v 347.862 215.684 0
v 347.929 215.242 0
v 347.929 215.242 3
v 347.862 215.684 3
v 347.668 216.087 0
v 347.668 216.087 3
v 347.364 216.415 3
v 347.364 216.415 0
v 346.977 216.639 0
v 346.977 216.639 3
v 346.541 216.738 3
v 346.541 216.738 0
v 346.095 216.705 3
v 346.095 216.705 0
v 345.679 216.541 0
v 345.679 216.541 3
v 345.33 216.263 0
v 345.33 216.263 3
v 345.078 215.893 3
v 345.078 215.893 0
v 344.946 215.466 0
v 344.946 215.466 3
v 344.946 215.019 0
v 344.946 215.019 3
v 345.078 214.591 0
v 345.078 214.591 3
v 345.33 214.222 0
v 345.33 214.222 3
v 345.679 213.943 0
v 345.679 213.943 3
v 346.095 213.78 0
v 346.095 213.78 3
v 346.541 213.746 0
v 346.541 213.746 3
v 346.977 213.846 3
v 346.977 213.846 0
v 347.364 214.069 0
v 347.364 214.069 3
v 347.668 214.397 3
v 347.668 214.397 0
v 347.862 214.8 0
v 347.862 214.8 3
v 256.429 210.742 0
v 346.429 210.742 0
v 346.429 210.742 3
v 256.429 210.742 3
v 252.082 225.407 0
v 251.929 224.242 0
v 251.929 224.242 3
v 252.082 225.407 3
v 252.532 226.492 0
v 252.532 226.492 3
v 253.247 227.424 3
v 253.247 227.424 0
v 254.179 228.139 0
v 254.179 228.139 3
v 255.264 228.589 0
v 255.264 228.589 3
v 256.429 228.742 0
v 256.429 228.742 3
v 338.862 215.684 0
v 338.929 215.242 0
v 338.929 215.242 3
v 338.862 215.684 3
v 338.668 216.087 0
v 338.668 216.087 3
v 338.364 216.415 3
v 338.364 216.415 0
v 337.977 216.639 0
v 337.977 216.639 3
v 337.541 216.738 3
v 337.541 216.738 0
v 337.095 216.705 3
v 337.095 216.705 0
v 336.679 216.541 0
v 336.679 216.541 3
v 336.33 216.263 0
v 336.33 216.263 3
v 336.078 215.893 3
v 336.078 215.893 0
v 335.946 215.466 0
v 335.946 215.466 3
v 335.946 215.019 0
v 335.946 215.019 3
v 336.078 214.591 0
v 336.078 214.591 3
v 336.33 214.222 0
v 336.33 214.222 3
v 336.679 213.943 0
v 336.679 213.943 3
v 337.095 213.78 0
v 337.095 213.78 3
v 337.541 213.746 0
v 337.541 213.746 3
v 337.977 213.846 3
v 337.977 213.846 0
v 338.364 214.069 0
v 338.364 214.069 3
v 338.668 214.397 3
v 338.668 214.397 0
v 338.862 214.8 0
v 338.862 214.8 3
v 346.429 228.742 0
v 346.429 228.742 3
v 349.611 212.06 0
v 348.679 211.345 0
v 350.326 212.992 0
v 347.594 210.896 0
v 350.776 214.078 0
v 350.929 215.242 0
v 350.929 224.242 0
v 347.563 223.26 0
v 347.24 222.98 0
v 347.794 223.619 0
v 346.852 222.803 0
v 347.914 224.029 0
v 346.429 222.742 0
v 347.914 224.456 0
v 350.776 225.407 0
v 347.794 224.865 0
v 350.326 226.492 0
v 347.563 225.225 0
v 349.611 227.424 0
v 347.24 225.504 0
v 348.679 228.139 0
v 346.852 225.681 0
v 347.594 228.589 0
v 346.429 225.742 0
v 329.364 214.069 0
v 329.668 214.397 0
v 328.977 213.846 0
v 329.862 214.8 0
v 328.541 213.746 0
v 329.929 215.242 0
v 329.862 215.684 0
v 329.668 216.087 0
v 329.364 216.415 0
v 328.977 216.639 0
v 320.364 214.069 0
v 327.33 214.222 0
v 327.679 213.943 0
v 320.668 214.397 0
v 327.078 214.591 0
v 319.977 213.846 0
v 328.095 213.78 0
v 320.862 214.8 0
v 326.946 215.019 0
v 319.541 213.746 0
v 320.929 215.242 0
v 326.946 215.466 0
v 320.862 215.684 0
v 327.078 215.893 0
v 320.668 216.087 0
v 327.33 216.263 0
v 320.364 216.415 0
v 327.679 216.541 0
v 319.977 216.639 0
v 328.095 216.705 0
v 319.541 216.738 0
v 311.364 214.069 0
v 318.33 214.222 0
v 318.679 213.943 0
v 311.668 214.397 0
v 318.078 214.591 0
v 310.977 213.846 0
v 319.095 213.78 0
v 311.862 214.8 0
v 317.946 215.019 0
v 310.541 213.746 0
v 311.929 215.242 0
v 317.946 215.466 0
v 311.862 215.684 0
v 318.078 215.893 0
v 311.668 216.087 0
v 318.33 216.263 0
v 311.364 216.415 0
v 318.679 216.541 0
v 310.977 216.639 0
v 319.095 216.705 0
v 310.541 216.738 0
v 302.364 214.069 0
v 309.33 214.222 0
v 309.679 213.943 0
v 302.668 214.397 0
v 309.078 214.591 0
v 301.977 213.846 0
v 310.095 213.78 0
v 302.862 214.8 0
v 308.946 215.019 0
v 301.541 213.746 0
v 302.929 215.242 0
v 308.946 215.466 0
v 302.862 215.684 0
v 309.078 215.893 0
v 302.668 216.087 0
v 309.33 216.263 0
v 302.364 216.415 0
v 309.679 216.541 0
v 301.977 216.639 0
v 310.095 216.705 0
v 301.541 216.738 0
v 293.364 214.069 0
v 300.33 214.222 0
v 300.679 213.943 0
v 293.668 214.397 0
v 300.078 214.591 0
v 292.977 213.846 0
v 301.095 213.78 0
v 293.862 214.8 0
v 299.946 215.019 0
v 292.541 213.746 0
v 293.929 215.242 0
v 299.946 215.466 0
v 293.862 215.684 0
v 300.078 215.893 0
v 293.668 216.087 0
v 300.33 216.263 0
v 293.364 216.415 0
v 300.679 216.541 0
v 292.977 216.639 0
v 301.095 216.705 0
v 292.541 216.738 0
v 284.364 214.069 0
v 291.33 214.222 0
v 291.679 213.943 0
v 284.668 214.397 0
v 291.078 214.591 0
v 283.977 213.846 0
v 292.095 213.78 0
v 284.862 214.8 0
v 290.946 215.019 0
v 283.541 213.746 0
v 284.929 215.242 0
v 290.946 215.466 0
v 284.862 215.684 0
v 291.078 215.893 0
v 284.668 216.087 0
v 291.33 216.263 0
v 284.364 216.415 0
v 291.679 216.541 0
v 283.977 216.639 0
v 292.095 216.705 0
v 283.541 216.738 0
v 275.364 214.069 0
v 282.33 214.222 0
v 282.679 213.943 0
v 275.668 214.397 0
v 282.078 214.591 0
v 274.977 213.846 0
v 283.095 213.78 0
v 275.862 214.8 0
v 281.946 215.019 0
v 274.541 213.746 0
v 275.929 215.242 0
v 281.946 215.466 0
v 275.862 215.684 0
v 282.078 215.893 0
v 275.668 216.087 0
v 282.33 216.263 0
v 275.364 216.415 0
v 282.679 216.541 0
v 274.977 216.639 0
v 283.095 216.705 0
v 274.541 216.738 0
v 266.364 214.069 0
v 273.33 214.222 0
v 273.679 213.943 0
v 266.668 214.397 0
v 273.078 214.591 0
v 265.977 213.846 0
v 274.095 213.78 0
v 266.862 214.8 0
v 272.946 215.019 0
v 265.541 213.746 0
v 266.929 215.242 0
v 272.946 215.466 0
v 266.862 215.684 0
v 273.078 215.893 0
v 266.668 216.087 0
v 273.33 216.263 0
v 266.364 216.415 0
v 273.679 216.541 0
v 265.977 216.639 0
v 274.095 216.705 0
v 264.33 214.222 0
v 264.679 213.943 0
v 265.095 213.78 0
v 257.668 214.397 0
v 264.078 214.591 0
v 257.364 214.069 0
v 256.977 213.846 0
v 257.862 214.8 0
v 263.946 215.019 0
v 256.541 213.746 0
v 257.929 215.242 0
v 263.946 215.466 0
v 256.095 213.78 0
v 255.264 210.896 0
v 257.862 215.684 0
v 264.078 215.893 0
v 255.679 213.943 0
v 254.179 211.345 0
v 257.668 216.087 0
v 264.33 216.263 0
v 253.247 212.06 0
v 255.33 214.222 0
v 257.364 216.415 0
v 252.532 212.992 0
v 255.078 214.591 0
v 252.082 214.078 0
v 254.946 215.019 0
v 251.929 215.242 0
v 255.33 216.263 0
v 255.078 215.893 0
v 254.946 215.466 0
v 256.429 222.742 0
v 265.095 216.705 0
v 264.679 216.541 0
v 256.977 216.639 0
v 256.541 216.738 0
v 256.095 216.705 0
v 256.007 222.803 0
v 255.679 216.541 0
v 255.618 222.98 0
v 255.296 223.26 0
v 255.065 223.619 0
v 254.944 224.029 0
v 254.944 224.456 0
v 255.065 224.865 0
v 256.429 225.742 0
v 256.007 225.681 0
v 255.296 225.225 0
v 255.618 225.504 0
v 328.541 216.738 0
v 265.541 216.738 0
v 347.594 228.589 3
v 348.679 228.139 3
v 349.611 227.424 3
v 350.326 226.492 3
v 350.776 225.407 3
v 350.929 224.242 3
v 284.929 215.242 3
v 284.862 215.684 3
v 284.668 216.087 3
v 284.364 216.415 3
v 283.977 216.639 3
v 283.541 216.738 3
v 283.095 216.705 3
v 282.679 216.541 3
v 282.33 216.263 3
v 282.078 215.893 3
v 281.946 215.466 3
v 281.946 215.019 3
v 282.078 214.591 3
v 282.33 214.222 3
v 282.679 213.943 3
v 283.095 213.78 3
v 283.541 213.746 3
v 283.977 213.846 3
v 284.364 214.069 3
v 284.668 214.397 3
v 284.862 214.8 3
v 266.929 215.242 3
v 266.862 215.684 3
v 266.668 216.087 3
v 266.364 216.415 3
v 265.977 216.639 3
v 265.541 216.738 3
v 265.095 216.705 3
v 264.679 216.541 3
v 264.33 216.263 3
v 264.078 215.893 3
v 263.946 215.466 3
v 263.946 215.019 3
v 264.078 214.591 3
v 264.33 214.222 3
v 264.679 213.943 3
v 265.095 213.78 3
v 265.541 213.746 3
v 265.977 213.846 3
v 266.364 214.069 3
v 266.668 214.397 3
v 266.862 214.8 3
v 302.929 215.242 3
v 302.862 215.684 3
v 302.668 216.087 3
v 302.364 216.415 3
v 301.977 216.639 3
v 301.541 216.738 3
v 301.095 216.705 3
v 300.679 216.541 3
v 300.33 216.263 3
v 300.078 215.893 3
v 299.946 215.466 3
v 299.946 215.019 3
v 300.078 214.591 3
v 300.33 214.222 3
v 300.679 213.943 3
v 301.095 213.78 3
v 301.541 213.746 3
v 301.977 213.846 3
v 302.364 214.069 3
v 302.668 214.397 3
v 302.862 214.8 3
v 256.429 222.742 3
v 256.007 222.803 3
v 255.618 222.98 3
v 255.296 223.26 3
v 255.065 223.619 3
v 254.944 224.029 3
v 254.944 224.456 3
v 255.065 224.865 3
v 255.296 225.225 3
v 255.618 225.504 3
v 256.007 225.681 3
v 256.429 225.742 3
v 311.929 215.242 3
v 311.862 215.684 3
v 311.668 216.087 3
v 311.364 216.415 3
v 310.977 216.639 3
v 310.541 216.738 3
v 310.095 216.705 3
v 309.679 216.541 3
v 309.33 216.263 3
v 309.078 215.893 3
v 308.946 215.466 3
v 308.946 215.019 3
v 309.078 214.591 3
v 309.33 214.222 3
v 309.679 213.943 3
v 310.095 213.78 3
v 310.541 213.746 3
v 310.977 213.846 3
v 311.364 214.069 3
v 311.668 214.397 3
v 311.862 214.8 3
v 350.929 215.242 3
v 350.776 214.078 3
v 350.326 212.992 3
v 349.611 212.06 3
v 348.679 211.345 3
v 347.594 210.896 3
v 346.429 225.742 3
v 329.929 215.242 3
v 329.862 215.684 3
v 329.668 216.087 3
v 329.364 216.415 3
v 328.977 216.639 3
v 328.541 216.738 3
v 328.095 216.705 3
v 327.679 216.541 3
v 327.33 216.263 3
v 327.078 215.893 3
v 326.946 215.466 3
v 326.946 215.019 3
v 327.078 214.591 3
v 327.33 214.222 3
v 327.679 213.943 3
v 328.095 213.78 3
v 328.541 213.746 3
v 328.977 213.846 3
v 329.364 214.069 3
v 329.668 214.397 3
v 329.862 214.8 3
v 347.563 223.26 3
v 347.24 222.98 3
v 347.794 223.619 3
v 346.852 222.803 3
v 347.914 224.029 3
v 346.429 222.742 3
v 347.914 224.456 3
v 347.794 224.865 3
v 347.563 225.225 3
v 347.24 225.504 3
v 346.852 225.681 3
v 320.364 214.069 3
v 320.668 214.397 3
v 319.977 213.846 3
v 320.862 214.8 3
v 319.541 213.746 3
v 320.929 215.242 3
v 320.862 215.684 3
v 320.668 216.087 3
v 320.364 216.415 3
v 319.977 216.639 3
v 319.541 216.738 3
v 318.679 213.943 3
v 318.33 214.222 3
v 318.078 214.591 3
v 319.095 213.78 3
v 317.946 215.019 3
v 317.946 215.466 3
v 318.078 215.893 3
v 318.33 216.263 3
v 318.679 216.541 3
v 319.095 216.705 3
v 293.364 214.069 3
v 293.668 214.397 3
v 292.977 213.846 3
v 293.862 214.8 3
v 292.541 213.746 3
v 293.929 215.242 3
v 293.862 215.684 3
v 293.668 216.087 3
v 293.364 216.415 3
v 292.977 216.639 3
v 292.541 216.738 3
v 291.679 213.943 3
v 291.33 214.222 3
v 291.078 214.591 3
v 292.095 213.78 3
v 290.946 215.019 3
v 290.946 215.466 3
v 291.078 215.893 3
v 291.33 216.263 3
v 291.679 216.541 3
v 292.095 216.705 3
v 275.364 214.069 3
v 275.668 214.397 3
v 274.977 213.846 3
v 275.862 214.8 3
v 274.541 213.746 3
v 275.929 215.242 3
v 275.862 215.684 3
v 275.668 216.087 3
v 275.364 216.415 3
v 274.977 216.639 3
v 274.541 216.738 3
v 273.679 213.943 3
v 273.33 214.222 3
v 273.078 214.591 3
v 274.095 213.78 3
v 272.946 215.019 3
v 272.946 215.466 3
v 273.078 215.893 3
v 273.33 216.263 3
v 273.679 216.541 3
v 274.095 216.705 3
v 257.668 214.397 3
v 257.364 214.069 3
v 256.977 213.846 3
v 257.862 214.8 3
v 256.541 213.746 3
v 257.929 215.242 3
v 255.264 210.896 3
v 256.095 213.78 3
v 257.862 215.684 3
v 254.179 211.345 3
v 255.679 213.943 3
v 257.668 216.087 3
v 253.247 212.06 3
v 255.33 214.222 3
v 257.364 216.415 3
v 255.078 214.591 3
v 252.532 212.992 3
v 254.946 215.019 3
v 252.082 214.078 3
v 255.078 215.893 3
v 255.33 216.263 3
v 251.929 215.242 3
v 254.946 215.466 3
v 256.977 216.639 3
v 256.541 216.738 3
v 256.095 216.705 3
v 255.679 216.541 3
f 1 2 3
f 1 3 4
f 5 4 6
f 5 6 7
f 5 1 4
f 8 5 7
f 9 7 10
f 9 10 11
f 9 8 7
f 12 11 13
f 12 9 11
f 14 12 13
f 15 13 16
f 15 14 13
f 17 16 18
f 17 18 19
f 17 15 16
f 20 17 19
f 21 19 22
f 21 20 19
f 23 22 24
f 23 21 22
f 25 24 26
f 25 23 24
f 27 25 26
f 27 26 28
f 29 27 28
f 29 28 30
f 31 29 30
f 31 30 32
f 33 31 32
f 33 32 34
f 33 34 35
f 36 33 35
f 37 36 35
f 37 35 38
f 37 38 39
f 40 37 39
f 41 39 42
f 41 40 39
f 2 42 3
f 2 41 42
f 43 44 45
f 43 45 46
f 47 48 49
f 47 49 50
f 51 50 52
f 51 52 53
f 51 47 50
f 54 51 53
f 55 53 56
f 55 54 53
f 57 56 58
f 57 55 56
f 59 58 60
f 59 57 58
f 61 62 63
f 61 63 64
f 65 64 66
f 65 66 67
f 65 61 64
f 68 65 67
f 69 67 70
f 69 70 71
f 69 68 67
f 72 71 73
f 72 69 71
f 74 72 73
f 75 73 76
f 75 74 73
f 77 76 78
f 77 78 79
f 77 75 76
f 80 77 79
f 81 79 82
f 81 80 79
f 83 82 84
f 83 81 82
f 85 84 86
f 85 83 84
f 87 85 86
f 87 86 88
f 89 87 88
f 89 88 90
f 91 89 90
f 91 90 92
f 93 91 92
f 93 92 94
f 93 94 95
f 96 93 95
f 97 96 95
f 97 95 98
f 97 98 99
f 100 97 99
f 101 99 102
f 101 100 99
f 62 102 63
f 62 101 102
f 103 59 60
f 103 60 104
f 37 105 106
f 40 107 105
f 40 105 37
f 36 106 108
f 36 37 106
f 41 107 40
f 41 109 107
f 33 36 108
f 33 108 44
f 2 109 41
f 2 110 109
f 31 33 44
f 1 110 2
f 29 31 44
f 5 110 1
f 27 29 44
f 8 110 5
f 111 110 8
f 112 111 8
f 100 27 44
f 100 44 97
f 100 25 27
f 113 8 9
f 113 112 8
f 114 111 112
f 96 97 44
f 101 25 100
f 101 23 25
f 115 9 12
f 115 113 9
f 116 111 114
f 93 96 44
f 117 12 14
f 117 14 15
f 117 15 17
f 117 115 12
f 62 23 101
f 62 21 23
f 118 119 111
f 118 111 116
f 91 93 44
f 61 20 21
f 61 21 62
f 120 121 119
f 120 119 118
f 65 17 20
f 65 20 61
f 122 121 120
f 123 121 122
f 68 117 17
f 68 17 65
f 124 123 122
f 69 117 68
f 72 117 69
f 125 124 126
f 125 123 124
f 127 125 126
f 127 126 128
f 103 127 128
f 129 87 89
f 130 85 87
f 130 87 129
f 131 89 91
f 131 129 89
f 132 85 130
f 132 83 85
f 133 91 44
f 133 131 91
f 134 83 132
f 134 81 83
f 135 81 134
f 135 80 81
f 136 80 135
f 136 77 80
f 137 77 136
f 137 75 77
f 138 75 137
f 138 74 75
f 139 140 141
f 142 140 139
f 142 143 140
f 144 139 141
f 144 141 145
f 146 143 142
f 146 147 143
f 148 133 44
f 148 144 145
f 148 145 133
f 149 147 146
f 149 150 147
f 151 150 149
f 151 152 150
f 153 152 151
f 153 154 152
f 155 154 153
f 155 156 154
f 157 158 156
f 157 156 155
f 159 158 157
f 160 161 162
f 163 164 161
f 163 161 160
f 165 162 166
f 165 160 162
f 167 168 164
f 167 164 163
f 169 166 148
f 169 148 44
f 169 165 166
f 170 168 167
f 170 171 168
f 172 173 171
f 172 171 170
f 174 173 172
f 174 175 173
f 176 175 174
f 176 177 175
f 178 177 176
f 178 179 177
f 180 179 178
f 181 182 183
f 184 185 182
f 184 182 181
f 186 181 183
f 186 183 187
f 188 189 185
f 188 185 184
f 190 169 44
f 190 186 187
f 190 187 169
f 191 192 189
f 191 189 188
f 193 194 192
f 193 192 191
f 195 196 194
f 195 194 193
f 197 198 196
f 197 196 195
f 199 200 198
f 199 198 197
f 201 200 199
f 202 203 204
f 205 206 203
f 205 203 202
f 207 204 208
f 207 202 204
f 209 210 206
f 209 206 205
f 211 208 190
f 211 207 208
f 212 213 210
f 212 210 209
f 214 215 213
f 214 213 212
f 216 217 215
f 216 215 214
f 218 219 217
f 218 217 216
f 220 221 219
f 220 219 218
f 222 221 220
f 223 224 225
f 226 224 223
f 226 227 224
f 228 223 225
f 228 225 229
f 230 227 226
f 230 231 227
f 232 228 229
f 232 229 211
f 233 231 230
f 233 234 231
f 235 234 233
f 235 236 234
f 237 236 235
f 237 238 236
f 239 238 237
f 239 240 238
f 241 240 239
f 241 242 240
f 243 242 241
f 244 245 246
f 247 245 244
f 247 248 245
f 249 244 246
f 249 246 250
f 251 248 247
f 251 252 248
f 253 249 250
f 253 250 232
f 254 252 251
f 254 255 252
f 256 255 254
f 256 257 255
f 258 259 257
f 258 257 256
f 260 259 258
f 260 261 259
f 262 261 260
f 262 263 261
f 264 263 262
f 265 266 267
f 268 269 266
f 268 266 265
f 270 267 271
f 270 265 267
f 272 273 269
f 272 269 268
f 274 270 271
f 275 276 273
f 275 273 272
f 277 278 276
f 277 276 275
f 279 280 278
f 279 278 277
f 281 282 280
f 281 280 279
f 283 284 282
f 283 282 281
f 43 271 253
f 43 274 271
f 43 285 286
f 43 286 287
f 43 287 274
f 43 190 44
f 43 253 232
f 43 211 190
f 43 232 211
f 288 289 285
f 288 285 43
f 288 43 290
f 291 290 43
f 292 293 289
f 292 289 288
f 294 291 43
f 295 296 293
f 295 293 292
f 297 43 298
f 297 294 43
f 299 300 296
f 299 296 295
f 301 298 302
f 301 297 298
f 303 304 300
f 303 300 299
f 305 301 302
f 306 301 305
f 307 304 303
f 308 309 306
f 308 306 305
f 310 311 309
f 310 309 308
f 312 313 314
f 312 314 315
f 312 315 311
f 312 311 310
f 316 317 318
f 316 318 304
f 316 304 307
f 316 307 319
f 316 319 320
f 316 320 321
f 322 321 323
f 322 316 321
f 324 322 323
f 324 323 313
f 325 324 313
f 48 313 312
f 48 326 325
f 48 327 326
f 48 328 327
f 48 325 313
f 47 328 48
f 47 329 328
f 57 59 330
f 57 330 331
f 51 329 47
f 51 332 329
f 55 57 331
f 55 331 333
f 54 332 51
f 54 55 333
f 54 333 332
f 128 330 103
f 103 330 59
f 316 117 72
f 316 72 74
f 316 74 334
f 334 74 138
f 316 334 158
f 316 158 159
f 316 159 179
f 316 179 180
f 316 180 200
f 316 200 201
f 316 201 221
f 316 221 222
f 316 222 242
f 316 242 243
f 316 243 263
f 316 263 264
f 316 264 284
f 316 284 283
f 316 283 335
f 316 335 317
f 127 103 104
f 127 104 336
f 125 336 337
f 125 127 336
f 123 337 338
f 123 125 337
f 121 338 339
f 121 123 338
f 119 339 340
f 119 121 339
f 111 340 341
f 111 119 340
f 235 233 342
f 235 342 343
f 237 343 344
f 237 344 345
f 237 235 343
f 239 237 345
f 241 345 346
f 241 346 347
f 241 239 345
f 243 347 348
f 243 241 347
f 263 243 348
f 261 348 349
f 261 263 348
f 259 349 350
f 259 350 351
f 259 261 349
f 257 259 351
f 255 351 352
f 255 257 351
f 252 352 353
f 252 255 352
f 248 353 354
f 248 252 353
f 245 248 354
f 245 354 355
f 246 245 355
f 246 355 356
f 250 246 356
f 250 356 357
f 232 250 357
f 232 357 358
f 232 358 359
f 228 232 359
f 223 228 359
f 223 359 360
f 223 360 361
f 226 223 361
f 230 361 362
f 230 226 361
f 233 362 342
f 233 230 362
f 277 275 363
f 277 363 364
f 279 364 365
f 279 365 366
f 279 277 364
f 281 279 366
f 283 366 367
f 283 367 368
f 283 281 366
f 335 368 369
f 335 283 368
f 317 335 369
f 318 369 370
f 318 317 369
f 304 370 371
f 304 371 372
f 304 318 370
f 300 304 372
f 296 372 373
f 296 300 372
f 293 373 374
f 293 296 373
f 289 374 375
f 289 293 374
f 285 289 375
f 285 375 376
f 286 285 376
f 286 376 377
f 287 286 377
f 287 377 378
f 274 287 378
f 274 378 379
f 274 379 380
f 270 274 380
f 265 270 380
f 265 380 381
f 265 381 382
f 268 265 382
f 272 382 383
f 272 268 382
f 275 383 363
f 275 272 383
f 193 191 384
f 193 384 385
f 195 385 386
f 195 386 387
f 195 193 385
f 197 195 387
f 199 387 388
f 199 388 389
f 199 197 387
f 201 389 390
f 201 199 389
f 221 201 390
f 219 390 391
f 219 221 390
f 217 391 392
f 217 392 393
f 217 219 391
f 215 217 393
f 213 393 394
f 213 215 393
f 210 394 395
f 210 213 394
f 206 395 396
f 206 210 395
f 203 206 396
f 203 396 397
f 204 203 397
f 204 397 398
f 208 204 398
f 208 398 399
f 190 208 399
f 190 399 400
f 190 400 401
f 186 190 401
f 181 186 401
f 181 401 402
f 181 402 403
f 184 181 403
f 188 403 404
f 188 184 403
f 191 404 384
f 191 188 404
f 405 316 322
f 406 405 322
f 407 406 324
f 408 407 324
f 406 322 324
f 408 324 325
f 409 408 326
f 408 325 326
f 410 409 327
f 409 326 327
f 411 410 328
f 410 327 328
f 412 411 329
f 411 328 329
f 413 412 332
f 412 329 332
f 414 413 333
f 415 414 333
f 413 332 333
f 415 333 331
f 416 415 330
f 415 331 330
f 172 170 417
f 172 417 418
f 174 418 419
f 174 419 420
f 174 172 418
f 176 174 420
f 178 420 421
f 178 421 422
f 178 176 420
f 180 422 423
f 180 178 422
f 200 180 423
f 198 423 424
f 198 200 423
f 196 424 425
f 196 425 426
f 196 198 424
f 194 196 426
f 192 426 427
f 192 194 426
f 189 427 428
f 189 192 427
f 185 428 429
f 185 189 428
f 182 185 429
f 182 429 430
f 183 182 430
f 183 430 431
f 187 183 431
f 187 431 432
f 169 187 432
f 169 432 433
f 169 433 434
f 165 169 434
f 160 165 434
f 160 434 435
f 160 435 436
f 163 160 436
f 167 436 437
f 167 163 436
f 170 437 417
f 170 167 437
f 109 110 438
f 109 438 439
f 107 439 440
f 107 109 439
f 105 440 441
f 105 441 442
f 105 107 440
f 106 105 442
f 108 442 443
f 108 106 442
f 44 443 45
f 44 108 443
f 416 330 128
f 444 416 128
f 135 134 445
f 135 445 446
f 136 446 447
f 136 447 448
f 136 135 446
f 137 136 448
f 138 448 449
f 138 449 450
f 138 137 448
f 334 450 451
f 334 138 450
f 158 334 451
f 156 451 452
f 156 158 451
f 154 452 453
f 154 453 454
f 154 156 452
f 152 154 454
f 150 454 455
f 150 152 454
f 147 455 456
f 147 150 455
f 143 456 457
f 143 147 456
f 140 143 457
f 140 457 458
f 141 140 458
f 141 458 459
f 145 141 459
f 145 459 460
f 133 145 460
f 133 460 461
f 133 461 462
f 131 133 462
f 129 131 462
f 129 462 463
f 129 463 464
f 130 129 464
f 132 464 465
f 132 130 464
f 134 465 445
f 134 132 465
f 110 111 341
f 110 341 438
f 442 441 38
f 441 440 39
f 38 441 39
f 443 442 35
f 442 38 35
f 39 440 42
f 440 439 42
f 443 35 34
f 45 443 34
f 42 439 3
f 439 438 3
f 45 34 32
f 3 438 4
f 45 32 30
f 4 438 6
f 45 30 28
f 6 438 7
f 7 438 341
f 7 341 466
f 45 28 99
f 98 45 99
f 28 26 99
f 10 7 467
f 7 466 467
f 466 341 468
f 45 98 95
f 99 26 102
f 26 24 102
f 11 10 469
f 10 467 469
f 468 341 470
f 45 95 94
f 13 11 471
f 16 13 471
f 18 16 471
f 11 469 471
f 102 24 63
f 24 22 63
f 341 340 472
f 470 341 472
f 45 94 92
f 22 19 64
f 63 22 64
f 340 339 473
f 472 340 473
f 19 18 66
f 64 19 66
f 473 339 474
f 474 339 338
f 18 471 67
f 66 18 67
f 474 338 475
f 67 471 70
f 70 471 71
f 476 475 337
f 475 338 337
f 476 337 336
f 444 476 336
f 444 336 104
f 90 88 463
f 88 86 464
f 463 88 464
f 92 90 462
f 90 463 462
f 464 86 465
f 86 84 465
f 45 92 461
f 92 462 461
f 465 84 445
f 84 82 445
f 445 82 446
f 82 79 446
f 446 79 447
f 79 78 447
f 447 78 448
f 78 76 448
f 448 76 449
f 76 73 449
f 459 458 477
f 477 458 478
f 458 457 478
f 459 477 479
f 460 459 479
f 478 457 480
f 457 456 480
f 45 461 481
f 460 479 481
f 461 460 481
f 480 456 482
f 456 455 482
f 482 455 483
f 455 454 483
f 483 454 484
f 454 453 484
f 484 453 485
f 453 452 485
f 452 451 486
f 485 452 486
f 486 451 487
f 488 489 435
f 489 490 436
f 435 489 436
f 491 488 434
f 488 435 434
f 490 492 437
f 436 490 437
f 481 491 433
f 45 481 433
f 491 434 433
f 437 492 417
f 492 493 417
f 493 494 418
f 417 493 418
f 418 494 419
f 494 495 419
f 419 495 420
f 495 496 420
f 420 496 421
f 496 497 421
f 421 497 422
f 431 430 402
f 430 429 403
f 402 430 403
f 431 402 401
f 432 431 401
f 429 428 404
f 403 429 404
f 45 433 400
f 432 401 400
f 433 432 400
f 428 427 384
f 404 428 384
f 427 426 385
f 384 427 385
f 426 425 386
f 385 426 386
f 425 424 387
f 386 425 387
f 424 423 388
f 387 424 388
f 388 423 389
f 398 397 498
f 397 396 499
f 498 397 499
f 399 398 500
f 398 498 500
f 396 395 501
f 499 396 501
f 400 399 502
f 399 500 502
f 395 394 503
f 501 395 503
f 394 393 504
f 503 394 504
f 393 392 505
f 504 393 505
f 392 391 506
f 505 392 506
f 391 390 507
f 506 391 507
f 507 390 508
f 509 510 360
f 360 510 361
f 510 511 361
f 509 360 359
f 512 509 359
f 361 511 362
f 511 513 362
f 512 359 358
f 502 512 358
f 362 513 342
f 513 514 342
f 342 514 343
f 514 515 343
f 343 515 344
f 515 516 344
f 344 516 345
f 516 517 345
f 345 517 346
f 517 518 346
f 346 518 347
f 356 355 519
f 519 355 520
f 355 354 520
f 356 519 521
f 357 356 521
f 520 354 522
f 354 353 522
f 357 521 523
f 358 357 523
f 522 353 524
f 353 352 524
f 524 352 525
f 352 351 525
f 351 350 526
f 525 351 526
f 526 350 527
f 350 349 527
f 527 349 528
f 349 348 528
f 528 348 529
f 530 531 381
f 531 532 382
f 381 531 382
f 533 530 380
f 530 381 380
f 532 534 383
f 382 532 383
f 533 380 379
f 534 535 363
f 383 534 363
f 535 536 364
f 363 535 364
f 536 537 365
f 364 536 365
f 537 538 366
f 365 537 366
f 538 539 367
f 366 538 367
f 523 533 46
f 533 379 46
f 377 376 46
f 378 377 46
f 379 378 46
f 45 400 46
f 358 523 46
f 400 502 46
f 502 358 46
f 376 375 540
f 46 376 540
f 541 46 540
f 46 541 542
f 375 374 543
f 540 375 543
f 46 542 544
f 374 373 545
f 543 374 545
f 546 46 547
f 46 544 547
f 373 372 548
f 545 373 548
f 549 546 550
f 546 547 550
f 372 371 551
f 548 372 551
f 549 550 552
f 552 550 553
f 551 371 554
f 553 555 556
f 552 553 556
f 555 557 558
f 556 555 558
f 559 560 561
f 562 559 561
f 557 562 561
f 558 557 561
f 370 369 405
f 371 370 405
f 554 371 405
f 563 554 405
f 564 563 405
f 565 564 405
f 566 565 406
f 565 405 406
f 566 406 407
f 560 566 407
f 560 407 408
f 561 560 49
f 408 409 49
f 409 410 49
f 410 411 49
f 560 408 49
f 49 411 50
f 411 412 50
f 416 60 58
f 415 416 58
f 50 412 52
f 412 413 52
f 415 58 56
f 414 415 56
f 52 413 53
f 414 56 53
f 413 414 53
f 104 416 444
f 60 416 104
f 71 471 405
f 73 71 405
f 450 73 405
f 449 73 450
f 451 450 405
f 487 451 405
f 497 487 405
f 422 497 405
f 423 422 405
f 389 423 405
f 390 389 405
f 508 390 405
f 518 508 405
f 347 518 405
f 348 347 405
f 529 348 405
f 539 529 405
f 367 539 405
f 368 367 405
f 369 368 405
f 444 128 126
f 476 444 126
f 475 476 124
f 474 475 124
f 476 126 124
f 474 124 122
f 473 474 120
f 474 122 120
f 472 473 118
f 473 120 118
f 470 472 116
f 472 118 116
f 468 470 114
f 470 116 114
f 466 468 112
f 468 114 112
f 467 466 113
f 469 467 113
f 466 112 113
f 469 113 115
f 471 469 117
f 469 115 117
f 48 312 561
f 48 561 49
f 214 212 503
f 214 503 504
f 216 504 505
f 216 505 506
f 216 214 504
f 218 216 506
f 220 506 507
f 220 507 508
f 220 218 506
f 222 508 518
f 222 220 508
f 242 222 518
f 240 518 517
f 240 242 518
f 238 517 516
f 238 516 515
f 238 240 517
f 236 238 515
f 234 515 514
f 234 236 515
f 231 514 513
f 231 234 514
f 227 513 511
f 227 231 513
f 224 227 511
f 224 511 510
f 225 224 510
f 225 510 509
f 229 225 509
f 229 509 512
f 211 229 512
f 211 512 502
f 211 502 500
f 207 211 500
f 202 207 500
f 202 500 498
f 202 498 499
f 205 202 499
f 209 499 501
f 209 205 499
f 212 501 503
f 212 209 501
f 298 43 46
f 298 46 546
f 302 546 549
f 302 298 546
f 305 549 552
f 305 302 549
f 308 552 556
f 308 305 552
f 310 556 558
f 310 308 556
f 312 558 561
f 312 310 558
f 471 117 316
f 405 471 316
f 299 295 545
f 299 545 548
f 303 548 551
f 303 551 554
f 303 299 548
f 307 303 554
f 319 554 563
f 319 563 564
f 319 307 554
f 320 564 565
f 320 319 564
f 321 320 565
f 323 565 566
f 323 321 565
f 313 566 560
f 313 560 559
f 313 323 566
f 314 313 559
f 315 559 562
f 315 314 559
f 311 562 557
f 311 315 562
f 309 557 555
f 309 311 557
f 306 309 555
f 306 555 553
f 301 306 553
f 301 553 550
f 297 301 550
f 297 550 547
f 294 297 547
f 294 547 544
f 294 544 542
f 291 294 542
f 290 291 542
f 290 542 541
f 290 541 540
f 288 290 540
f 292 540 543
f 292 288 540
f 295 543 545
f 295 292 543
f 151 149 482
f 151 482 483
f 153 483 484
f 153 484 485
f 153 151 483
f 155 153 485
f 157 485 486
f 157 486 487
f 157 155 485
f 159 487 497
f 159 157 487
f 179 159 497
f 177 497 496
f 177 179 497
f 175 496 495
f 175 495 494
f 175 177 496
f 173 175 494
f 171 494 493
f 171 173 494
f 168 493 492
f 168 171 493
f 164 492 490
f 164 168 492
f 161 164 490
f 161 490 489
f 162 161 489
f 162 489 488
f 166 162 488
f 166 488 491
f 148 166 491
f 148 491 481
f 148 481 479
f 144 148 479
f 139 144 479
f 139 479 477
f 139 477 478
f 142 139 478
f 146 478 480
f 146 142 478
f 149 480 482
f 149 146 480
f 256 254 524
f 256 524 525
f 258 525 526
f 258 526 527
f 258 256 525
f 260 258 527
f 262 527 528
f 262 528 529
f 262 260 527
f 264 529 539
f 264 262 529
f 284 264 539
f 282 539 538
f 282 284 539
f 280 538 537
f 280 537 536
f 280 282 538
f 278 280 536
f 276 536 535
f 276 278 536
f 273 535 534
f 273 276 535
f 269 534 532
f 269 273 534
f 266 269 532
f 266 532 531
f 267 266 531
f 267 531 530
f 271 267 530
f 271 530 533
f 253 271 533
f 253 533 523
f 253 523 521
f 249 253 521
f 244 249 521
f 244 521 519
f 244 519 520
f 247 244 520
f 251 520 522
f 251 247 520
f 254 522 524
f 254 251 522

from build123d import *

# Parameters (mm, degrees)
MODEL_R                 = 1.5
SALIENTE_EXTRUIR1_DEPTH = 3


with BuildPart() as part:
    # Model → Saliente-Extruir1 (new body)
    with BuildSketch(Plane.XY):
        with BuildLine():
            Line((256.429131311, 228.742243614), (346.429131311, 228.742243614))
            ThreePointArc((346.429131311, 228.742243614), (349.611111826, 227.424224129), (350.929131311, 224.242243614))
            Line((350.929131311, 224.242243614), (350.929131311, 215.242243614))
            ThreePointArc((350.929131311, 215.242243614), (349.611111826, 212.060263099), (346.429131311, 210.742243614))
            Line((346.429131311, 210.742243614), (256.429131311, 210.742243614))
            ThreePointArc((256.429131311, 210.742243614), (253.247150795, 212.060263099), (251.929131311, 215.242243614))
            Line((251.929131311, 215.242243614), (251.929131311, 224.242243614))
            ThreePointArc((251.929131311, 224.242243614), (253.247150795, 227.424224129), (256.429131311, 228.742243614))
        make_face()
        with Locations((337.429131311, 215.242243614)):
            Circle(MODEL_R, mode=Mode.SUBTRACT)
        with Locations((319.429131311, 215.242243614)):
            Circle(MODEL_R, mode=Mode.SUBTRACT)
        with Locations((328.429131311, 215.242243614)):
            Circle(MODEL_R, mode=Mode.SUBTRACT)
        with Locations((310.429131311, 215.242243614)):
            Circle(MODEL_R, mode=Mode.SUBTRACT)
        with Locations((292.429131311, 215.242243614)):
            Circle(MODEL_R, mode=Mode.SUBTRACT)
        with Locations((301.429131311, 215.242243614)):
            Circle(MODEL_R, mode=Mode.SUBTRACT)
        with Locations((274.429131311, 215.242243614)):
            Circle(MODEL_R, mode=Mode.SUBTRACT)
        with Locations((283.429131311, 215.242243614)):
            Circle(MODEL_R, mode=Mode.SUBTRACT)
        with Locations((265.429131311, 215.242243614)):
            Circle(MODEL_R, mode=Mode.SUBTRACT)
        with Locations((256.429131311, 215.242243614)):
            Circle(MODEL_R, mode=Mode.SUBTRACT)
        with Locations((346.429131311, 215.242243614)):
            Circle(MODEL_R, mode=Mode.SUBTRACT)
        with BuildLine():
            Line((256.429131311, 225.742243614), (346.429131311, 225.742243614))
            ThreePointArc((346.429131311, 225.742243614), (347.929131311, 224.242243614), (346.429131311, 222.742243614))
            Line((346.429131311, 222.742243614), (256.429131311, 222.742243614))
            ThreePointArc((256.429131311, 222.742243614), (254.929131311, 224.242243614), (256.429131311, 225.742243614))
        make_face(mode=Mode.SUBTRACT)
    extrude(amount=SALIENTE_EXTRUIR1_DEPTH)


solid = part.part
